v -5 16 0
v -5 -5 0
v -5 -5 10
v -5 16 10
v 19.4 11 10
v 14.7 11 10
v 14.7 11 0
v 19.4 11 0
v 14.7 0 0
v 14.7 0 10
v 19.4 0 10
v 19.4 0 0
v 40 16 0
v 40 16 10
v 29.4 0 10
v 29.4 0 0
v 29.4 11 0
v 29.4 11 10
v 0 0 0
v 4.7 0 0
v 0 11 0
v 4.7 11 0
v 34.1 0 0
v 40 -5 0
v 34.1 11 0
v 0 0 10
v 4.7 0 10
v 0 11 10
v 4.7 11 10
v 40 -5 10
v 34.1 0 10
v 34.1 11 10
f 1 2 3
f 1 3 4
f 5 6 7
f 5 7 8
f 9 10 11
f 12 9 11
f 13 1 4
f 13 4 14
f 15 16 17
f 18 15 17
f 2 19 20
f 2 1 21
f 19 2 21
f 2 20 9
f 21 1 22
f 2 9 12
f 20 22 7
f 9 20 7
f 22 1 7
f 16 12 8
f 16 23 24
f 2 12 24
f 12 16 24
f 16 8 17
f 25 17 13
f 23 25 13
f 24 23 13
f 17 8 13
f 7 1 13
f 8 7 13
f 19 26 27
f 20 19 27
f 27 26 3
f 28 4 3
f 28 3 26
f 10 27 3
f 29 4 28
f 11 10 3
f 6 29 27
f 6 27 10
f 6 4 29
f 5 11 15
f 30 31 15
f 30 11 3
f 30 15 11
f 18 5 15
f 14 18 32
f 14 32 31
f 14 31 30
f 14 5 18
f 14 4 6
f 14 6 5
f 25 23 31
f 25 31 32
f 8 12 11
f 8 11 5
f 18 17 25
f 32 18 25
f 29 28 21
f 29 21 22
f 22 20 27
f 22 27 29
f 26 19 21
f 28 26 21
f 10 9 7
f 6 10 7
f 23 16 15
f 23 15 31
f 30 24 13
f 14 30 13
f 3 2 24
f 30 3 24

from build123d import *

# Parameters (mm, degrees)
BOX_W        = 4.7
BOX_H        = 11
BOX_DEPTH    = 13
BOX001_W     = 4.7
BOX001_H     = 11
BOX001_DEPTH = 13
BOX002_W     = 4.7
BOX002_H     = 11
BOX002_DEPTH = 13
BOX003_W     = 45
BOX003_H     = 21
BOX003_DEPTH = 10


with BuildPart() as cub:
    # Box → Box (new body)
    with BuildSketch(Plane.XY.offset(-1)):
        with Locations((2.35, 5.5)):
            Rectangle(BOX_W, BOX_H)
    extrude(amount=BOX_DEPTH)


with BuildPart() as cub001:
    # Box001 → Box001 (new body)
    with BuildSketch(Plane(origin=(14.7, 0, -1), x_dir=(1, 0, 0), z_dir=(0, 0, 1))):
        with Locations((2.35, 5.5)):
            Rectangle(BOX001_W, BOX001_H)
    extrude(amount=BOX001_DEPTH)


with BuildPart() as cub002:
    # Box002 → Box002 (new body)
    with BuildSketch(Plane(origin=(29.4, 0, -1), x_dir=(1, 0, 0), z_dir=(0, 0, 1))):
        with Locations((2.35, 5.5)):
            Rectangle(BOX002_W, BOX002_H)
    extrude(amount=BOX002_DEPTH)


with BuildPart() as cut002:
    # Box003 → Box003 (new body)
    with BuildSketch(Plane(origin=(-5, -5, 0), x_dir=(1, 0, 0), z_dir=(0, 0, 1))):
        with Locations((22.5, 10.5)):
            Rectangle(BOX003_W, BOX003_H)
    extrude(amount=BOX003_DEPTH)

    # Cut: cut Cub002
    add(cub002.part, mode=Mode.SUBTRACT)

    # Cut001: cut Cub001
    add(cub001.part, mode=Mode.SUBTRACT)

    # Cut002: cut Cub
    add(cub.part, mode=Mode.SUBTRACT)


solid = cut002.part
